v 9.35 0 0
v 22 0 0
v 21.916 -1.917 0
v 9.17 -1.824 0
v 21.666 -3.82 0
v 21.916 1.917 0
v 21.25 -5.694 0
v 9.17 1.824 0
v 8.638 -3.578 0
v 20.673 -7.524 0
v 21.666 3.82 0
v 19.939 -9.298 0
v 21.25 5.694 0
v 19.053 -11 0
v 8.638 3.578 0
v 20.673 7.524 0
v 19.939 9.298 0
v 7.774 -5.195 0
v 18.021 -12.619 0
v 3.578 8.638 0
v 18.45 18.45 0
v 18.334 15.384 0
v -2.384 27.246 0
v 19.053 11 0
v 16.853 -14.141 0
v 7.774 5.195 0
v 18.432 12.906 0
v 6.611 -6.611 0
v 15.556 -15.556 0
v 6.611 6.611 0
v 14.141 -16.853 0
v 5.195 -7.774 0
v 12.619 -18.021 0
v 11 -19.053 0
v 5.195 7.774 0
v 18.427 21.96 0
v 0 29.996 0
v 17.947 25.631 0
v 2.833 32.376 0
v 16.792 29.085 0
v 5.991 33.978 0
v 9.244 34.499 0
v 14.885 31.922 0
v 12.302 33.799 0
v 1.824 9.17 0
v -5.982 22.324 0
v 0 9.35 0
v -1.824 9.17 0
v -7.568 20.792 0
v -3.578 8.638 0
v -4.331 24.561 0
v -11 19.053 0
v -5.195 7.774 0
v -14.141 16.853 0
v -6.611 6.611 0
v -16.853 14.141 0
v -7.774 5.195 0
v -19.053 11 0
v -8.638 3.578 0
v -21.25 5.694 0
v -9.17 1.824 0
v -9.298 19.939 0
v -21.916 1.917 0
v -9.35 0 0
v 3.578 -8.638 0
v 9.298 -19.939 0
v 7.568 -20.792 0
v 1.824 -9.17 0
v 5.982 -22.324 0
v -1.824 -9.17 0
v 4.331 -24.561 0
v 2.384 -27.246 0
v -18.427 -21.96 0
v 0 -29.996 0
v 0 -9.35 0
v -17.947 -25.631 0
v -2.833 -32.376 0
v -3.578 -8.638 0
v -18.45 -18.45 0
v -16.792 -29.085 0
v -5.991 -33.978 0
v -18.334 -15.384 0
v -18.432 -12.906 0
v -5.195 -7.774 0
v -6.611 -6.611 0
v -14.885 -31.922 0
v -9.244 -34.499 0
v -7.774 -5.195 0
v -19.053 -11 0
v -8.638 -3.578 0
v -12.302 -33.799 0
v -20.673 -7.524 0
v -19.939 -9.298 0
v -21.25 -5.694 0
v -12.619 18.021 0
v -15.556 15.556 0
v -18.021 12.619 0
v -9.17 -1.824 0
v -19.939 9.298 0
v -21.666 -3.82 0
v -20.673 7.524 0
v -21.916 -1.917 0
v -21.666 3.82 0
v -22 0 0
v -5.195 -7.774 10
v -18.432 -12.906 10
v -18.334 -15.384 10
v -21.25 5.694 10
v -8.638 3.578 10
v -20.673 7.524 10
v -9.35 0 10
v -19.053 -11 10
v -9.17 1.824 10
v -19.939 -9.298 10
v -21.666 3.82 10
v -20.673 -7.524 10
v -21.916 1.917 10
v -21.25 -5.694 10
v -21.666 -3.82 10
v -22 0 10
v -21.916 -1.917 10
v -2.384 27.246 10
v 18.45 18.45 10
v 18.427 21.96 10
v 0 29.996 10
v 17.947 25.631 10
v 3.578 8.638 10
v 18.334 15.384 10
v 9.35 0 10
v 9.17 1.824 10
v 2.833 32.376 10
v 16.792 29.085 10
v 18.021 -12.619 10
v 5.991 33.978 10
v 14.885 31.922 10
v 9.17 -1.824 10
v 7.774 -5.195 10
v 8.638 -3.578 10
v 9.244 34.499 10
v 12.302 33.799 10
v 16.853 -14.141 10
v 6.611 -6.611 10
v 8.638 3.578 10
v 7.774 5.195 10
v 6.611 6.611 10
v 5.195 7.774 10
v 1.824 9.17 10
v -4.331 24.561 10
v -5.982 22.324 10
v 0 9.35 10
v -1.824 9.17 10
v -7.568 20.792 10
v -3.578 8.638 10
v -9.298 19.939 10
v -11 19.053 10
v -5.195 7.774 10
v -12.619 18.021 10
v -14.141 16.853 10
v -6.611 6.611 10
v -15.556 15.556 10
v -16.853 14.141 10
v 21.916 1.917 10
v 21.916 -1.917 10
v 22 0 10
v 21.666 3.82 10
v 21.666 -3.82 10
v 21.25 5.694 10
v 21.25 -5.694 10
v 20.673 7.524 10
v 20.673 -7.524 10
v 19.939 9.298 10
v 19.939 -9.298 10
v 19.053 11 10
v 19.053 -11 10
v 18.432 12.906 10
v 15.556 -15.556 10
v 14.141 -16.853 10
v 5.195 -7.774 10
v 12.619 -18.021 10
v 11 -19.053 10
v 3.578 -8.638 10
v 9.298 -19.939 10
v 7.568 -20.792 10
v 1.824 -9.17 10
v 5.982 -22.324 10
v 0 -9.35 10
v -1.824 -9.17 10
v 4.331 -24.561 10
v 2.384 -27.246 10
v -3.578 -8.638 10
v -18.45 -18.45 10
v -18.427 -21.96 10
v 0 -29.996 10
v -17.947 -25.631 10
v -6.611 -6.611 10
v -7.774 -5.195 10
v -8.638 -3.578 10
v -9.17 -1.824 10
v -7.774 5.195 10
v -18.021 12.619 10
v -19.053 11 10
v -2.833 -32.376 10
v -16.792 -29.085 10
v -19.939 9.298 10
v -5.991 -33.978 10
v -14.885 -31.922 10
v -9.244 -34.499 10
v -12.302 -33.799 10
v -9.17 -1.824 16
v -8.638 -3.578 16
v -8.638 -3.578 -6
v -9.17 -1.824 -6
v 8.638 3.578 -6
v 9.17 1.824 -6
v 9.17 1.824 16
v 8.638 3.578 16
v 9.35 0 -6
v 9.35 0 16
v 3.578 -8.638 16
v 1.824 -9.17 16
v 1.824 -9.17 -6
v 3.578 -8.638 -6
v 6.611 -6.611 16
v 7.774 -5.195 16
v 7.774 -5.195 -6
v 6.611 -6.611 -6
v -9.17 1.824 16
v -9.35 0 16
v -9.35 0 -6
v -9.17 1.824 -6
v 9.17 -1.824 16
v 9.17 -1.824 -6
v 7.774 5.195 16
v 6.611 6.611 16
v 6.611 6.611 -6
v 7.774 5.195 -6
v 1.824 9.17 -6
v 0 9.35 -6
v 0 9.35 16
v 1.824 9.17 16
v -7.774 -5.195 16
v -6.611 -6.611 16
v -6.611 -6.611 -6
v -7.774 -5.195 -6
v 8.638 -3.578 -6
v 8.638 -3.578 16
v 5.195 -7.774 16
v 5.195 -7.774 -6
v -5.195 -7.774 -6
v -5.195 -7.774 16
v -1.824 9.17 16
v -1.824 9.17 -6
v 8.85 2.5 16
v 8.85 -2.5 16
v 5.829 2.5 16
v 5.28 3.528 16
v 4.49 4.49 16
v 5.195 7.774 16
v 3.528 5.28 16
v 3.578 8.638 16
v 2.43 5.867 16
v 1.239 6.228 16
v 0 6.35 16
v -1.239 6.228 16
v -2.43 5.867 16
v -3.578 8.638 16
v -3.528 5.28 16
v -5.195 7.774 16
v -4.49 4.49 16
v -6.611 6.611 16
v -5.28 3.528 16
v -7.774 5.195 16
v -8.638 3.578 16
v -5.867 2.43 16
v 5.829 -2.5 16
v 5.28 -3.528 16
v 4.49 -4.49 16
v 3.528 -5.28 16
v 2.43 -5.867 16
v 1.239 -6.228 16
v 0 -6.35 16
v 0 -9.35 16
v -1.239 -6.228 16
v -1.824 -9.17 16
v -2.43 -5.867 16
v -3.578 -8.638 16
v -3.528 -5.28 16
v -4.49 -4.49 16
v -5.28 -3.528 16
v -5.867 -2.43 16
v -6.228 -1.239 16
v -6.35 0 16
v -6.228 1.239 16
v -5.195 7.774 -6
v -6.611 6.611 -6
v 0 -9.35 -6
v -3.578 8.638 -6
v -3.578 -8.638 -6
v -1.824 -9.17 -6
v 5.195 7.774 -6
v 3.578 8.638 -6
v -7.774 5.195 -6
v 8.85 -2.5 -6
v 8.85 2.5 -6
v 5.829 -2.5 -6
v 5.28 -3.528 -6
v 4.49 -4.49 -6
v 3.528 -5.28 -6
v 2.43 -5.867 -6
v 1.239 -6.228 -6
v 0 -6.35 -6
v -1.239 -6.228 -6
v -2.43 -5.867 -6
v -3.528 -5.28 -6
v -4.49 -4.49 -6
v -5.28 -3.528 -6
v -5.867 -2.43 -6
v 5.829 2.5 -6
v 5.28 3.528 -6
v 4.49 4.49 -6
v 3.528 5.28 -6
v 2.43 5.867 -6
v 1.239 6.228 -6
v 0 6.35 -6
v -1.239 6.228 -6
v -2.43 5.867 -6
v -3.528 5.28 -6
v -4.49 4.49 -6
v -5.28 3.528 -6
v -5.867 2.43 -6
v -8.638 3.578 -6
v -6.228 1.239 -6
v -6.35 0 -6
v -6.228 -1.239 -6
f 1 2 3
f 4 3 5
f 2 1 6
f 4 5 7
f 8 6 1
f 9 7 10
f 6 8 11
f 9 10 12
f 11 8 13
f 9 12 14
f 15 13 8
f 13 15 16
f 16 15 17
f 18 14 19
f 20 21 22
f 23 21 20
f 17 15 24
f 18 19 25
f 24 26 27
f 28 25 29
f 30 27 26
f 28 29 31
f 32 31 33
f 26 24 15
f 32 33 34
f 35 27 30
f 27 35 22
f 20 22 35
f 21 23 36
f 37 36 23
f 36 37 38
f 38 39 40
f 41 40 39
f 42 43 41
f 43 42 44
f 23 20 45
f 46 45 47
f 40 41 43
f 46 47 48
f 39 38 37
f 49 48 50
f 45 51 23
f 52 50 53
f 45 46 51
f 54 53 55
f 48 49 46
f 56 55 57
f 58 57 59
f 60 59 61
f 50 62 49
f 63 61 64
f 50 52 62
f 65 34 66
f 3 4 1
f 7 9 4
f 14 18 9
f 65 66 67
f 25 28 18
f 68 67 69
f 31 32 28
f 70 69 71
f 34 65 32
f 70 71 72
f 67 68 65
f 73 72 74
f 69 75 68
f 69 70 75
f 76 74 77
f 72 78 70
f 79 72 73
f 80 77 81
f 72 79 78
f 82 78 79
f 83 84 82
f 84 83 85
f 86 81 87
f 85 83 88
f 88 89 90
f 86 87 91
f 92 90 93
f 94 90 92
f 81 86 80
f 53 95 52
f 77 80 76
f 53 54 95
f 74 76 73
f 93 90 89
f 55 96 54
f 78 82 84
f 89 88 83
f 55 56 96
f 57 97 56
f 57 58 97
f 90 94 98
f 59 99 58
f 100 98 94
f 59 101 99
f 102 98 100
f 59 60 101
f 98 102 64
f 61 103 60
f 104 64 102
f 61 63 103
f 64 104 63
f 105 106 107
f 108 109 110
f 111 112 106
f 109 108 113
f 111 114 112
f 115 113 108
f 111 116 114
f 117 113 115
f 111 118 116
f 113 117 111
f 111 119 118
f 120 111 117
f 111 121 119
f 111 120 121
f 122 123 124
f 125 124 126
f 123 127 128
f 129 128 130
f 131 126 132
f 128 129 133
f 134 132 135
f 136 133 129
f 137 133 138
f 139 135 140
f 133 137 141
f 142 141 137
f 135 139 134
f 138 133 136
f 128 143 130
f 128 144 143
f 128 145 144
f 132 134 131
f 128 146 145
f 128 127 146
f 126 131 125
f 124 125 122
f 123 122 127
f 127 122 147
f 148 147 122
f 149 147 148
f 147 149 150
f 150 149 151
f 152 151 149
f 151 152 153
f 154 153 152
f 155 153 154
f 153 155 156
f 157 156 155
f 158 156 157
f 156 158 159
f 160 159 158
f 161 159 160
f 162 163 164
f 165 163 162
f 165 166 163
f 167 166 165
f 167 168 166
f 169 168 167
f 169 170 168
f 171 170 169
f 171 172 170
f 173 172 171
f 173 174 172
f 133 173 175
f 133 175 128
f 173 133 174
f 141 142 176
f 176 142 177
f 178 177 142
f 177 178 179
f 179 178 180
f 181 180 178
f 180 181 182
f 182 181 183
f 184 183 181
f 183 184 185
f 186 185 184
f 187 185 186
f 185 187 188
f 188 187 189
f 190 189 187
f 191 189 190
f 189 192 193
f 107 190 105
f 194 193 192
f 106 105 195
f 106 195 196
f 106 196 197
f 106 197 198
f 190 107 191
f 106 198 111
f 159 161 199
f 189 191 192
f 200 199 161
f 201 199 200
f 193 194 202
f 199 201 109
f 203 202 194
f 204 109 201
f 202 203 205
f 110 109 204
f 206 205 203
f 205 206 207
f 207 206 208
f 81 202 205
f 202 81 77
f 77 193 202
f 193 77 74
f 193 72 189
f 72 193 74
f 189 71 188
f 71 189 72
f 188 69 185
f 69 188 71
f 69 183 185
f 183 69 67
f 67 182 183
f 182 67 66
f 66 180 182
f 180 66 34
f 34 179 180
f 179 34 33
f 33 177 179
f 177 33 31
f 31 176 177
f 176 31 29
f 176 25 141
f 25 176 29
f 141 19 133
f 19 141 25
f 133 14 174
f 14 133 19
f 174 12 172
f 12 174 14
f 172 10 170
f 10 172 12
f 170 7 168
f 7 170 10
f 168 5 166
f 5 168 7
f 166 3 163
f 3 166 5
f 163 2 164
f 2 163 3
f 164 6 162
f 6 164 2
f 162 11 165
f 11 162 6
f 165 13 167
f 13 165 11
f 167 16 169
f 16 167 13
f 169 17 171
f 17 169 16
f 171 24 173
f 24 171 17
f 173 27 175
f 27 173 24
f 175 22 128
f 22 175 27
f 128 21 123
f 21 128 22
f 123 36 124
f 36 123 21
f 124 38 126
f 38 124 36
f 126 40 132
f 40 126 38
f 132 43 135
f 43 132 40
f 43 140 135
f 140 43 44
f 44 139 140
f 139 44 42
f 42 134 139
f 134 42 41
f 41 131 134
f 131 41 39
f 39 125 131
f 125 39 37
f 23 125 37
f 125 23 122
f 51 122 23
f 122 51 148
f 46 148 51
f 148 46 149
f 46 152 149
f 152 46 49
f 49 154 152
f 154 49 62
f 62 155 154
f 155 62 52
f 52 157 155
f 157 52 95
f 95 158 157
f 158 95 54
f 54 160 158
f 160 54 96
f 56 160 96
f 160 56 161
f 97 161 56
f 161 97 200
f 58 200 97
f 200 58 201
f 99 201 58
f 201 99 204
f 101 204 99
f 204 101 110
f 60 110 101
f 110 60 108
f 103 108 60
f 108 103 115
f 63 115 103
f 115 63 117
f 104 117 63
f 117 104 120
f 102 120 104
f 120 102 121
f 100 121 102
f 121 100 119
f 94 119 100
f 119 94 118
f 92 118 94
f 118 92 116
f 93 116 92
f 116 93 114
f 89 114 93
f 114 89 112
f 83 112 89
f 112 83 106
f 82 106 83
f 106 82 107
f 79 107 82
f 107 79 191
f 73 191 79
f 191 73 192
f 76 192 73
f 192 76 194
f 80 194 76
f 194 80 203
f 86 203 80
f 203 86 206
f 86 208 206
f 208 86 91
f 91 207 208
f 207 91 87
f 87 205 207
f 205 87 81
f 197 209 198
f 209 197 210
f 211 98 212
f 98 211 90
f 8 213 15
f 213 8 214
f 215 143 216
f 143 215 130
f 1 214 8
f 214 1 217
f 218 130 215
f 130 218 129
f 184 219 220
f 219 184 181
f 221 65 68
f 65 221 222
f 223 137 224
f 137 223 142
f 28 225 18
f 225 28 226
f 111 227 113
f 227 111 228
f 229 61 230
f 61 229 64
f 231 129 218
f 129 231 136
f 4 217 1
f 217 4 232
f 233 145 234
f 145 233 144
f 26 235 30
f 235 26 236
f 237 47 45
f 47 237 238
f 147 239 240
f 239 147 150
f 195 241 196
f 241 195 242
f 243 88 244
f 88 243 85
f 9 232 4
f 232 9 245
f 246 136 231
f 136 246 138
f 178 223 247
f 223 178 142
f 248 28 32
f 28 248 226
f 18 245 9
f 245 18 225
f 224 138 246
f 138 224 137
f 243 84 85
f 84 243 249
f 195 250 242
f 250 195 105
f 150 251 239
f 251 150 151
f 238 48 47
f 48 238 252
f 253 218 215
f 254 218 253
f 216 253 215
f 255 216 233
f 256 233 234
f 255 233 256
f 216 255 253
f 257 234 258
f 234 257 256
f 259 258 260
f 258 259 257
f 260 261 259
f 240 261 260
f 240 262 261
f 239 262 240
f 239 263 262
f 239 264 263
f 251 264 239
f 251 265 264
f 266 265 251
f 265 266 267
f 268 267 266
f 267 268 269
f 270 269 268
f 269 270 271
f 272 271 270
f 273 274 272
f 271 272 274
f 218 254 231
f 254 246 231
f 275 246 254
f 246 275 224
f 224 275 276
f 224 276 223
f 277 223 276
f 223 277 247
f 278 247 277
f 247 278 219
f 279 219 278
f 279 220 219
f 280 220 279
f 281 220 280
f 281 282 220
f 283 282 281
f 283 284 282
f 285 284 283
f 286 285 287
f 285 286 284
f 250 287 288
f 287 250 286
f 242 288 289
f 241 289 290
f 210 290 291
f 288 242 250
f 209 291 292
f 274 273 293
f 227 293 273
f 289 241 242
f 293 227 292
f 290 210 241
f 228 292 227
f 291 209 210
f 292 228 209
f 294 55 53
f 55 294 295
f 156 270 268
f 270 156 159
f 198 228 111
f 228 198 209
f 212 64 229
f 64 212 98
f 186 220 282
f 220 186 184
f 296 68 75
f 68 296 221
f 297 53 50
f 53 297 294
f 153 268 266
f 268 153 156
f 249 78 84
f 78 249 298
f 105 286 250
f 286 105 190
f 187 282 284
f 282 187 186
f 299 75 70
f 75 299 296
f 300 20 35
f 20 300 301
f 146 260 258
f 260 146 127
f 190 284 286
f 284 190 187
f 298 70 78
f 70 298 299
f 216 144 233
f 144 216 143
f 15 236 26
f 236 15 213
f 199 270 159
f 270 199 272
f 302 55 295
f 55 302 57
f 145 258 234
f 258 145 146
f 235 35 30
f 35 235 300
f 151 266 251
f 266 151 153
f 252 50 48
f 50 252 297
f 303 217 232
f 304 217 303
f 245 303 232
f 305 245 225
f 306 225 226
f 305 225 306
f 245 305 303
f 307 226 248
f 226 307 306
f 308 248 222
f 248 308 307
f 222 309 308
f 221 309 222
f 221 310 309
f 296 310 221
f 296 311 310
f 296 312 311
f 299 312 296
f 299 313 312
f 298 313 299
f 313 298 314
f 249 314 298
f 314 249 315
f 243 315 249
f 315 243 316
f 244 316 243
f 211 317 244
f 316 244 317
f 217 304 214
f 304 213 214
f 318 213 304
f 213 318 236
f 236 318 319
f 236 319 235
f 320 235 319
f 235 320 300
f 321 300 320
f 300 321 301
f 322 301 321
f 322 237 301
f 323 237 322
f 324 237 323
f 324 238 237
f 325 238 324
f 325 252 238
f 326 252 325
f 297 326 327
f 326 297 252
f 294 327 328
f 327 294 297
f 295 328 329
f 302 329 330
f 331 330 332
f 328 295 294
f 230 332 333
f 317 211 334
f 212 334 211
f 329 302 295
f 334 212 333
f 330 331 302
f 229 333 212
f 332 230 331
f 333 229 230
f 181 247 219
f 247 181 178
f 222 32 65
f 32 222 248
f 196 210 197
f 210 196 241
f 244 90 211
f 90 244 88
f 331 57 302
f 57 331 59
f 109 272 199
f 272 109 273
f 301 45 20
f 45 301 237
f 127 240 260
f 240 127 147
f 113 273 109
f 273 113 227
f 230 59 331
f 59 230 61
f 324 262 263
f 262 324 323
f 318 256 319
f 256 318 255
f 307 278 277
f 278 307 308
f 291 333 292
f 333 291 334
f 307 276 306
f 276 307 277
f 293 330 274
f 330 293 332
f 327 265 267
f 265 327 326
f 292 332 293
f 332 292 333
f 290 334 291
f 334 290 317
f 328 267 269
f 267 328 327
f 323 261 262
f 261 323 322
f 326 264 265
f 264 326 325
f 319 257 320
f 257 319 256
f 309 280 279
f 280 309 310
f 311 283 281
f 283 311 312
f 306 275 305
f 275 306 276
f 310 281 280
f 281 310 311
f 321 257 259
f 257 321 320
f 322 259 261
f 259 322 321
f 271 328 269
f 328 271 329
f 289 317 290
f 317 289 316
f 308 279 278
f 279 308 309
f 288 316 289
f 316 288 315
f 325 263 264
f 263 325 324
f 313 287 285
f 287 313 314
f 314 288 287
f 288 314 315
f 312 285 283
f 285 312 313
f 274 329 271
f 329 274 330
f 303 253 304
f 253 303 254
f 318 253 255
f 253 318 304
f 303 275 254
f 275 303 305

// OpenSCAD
$fn = 32;

// ----------------------------------------------------------------------
// Cam: base radius 22 mm with a 14 mm lift over 150 degrees
// ----------------------------------------------------------------------

// --- parameters (mm) ---
base_r = 22;              // base radius
lift = 14;                // lift height above the base radius
lift_span = 150;          // angular width of the lift
lift_start = 30;          // angle where the lift starts
cam_t = 10;               // cam plate thickness
hub_d = 18.7;             // hub diameter
hub_h = 22;               // hub height
bore_d = 12.7;            // bore
key_w = 5;                // keyway width
key_depth = 1.6;          // keyway depth

cam_profile = [[22, 0], [21.916, 1.917], [21.666, 3.82], [21.25, 5.694], [20.673, 7.524], [19.939, 9.298], [19.053, 11], [18.432, 12.906], [18.334, 15.384], [18.45, 18.45], [18.427, 21.96], [17.947, 25.631], [16.792, 29.085], [14.885, 31.922], [12.302, 33.799], [9.244, 34.499], [5.991, 33.978], [2.833, 32.376], [0, 29.996], [-2.384, 27.246], [-4.331, 24.561], [-5.982, 22.324], [-7.568, 20.792], [-9.298, 19.939], [-11, 19.053], [-12.619, 18.021], [-14.141, 16.853], [-15.556, 15.556], [-16.853, 14.141], [-18.021, 12.619], [-19.053, 11], [-19.939, 9.298], [-20.673, 7.524], [-21.25, 5.694], [-21.666, 3.82], [-21.916, 1.917], [-22, 0], [-21.916, -1.917], [-21.666, -3.82], [-21.25, -5.694], [-20.673, -7.524], [-19.939, -9.298], [-19.053, -11], [-18.432, -12.906], [-18.334, -15.384], [-18.45, -18.45], [-18.427, -21.96], [-17.947, -25.631], [-16.792, -29.085], [-14.885, -31.922], [-12.302, -33.799], [-9.244, -34.499], [-5.991, -33.978], [-2.833, -32.376], [0, -29.996], [2.384, -27.246], [4.331, -24.561], [5.982, -22.324], [7.568, -20.792], [9.298, -19.939], [11, -19.053], [12.619, -18.021], [14.141, -16.853], [15.556, -15.556], [16.853, -14.141], [18.021, -12.619], [19.053, -11], [19.939, -9.298], [20.673, -7.524], [21.25, -5.694], [21.666, -3.82], [21.916, -1.917]];

difference() {
  union() {
    linear_extrude(height = cam_t) polygon(cam_profile);
    /* hub, proud of the cam plate on both sides */
    translate([0, 0, -6]) cylinder(h = hub_h, d = hub_d);
  }
  /* bore through the hub, 2.5 mm clear on both faces */
  translate([0, 0, -8.5]) cylinder(h = hub_h + 5, d = bore_d);
  /* keyway, milled through the whole hub */
  translate([4.75, -2.5, -8.5]) cube([4.1, 5, 27]);
}
